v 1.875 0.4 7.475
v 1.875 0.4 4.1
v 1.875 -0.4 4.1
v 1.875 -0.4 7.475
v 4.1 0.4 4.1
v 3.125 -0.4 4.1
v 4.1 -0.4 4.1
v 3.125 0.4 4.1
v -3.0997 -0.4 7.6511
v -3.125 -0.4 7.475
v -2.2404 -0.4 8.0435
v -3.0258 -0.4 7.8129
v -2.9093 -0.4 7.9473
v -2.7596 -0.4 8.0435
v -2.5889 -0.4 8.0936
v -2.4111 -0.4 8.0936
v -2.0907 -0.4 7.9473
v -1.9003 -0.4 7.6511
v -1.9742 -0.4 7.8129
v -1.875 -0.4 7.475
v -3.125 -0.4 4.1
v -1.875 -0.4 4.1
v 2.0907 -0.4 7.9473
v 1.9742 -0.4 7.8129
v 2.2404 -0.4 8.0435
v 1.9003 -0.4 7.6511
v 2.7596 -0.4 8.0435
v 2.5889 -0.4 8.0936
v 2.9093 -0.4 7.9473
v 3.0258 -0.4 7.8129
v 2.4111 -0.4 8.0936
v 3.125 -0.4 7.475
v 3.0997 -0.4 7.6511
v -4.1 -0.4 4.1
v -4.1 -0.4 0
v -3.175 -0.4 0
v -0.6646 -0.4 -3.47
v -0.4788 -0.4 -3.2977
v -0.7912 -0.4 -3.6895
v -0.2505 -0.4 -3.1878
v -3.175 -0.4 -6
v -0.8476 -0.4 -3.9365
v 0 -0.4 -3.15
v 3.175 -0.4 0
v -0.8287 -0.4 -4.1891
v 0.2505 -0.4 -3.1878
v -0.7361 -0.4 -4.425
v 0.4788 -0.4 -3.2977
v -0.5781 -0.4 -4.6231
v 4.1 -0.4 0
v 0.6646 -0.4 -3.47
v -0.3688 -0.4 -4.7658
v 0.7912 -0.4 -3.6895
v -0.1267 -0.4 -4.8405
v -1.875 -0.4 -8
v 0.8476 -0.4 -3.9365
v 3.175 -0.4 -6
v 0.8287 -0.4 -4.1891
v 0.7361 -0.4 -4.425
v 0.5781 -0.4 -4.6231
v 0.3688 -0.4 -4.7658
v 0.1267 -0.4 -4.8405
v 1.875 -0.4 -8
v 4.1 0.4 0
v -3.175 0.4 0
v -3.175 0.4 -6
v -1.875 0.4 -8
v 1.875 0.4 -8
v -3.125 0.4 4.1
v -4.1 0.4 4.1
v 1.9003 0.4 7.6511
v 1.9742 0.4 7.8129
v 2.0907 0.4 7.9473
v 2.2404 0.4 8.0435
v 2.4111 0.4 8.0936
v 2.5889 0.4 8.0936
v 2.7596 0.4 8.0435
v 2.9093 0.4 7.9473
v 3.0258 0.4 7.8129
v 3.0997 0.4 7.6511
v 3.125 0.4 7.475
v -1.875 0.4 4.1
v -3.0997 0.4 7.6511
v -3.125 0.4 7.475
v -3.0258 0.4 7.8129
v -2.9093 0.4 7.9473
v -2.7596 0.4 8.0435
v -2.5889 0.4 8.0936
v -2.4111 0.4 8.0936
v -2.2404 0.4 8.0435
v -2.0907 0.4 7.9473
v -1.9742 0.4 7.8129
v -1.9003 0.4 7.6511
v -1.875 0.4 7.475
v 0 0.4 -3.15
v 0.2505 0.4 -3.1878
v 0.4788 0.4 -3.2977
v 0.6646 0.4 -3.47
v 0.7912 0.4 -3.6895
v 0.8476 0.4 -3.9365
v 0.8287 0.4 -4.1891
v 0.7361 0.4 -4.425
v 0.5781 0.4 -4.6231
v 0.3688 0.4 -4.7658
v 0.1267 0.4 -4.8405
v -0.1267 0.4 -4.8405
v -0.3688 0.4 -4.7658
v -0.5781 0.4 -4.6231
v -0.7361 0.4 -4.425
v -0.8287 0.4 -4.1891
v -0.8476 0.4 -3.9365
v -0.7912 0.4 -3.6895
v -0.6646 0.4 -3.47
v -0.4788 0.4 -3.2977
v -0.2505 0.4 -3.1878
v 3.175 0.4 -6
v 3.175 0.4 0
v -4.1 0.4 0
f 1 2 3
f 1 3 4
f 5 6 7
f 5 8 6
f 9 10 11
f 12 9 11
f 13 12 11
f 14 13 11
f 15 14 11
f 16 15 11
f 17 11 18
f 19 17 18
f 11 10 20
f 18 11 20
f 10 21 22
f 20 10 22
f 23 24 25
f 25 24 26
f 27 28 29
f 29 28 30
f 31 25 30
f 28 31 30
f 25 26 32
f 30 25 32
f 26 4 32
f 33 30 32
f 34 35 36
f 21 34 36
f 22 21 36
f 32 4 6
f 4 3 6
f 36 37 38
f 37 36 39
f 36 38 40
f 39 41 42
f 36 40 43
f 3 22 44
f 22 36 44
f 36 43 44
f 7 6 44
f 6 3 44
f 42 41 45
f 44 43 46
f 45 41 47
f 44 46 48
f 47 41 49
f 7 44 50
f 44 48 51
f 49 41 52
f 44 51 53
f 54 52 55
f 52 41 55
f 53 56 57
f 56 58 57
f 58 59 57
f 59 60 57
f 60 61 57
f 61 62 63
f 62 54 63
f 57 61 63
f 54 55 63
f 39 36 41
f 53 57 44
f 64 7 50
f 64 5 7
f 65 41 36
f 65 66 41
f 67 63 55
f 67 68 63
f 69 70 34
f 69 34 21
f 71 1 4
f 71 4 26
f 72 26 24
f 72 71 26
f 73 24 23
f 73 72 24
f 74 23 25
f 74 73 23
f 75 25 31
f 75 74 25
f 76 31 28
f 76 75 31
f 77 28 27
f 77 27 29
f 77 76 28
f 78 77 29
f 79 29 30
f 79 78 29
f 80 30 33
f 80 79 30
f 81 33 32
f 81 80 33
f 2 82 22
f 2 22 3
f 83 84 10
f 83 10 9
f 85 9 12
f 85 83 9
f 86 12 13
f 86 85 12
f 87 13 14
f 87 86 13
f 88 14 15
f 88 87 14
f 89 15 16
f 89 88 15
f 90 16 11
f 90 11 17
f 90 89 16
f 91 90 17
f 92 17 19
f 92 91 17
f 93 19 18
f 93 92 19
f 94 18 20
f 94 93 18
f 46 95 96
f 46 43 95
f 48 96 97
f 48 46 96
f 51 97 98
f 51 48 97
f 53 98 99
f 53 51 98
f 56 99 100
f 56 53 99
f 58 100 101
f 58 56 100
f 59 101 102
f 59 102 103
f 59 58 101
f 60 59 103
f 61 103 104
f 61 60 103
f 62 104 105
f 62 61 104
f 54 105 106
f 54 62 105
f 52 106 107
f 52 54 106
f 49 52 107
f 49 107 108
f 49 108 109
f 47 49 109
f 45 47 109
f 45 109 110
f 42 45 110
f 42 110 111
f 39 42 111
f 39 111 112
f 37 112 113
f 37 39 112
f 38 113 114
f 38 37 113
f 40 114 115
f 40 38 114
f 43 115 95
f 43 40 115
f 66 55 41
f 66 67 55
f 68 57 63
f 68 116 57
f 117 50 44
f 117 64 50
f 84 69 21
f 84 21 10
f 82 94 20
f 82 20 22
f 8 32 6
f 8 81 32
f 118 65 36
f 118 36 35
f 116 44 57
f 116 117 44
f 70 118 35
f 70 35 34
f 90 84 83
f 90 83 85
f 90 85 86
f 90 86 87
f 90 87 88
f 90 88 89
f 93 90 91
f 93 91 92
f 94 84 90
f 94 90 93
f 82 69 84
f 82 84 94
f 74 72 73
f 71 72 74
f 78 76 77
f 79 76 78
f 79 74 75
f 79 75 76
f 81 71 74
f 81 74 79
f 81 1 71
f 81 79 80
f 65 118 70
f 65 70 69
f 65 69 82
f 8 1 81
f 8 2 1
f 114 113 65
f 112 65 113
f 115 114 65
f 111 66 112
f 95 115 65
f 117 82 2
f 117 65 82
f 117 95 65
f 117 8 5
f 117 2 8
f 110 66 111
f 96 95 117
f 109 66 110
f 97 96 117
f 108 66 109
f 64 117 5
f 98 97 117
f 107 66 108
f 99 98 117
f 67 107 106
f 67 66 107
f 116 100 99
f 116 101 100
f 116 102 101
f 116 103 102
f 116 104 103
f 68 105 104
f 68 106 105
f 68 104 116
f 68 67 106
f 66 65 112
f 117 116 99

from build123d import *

# Parameters (mm, degrees)
SKETCH1_R           = 0.85
BOSS_EXTRUDE1_DEPTH = 0.4


with BuildPart() as part:
    # Sketch1 → Boss-Extrude1 (new, symmetric)
    with BuildSketch(Plane(origin=(0, 0, 0), x_dir=(1, 0, 0), z_dir=(0, 1, 0))):
        with BuildLine():
            Line((-3.175, 6), (-3.175, 0))
            Line((-3.175, 0), (-4.1, 0))
            Line((-4.1, 0), (-4.1, -4.1))
            Line((-4.1, -4.1), (-3.125, -4.1))
            Line((-3.125, -4.1), (-3.125, -7.475))
            ThreePointArc((-3.125, -7.475), (-2.5, -8.1), (-1.875, -7.475))
            Line((-1.875, -7.475), (-1.875, -4.1))
            Line((-1.875, -4.1), (1.875, -4.1))
            Line((1.875, -4.1), (1.875, -7.475))
            ThreePointArc((1.875, -7.475), (2.5, -8.1), (3.125, -7.475))
            Line((3.125, -7.475), (3.125, -4.1))
            Line((3.125, -4.1), (4.1, -4.1))
            Line((4.1, -4.1), (4.1, 0))
            Line((4.1, 0), (3.175, 0))
            Line((3.175, 0), (3.175, 6))
            Line((3.175, 6), (1.875, 8))
            Line((1.875, 8), (-1.875, 8))
            Line((-1.875, 8), (-3.175, 6))
        make_face()
        with Locations(Location((0, 4, 0), (0, 0, 270))):
            Circle(SKETCH1_R, mode=Mode.SUBTRACT)
    extrude(amount=BOSS_EXTRUDE1_DEPTH, both=True)


solid = part.part
